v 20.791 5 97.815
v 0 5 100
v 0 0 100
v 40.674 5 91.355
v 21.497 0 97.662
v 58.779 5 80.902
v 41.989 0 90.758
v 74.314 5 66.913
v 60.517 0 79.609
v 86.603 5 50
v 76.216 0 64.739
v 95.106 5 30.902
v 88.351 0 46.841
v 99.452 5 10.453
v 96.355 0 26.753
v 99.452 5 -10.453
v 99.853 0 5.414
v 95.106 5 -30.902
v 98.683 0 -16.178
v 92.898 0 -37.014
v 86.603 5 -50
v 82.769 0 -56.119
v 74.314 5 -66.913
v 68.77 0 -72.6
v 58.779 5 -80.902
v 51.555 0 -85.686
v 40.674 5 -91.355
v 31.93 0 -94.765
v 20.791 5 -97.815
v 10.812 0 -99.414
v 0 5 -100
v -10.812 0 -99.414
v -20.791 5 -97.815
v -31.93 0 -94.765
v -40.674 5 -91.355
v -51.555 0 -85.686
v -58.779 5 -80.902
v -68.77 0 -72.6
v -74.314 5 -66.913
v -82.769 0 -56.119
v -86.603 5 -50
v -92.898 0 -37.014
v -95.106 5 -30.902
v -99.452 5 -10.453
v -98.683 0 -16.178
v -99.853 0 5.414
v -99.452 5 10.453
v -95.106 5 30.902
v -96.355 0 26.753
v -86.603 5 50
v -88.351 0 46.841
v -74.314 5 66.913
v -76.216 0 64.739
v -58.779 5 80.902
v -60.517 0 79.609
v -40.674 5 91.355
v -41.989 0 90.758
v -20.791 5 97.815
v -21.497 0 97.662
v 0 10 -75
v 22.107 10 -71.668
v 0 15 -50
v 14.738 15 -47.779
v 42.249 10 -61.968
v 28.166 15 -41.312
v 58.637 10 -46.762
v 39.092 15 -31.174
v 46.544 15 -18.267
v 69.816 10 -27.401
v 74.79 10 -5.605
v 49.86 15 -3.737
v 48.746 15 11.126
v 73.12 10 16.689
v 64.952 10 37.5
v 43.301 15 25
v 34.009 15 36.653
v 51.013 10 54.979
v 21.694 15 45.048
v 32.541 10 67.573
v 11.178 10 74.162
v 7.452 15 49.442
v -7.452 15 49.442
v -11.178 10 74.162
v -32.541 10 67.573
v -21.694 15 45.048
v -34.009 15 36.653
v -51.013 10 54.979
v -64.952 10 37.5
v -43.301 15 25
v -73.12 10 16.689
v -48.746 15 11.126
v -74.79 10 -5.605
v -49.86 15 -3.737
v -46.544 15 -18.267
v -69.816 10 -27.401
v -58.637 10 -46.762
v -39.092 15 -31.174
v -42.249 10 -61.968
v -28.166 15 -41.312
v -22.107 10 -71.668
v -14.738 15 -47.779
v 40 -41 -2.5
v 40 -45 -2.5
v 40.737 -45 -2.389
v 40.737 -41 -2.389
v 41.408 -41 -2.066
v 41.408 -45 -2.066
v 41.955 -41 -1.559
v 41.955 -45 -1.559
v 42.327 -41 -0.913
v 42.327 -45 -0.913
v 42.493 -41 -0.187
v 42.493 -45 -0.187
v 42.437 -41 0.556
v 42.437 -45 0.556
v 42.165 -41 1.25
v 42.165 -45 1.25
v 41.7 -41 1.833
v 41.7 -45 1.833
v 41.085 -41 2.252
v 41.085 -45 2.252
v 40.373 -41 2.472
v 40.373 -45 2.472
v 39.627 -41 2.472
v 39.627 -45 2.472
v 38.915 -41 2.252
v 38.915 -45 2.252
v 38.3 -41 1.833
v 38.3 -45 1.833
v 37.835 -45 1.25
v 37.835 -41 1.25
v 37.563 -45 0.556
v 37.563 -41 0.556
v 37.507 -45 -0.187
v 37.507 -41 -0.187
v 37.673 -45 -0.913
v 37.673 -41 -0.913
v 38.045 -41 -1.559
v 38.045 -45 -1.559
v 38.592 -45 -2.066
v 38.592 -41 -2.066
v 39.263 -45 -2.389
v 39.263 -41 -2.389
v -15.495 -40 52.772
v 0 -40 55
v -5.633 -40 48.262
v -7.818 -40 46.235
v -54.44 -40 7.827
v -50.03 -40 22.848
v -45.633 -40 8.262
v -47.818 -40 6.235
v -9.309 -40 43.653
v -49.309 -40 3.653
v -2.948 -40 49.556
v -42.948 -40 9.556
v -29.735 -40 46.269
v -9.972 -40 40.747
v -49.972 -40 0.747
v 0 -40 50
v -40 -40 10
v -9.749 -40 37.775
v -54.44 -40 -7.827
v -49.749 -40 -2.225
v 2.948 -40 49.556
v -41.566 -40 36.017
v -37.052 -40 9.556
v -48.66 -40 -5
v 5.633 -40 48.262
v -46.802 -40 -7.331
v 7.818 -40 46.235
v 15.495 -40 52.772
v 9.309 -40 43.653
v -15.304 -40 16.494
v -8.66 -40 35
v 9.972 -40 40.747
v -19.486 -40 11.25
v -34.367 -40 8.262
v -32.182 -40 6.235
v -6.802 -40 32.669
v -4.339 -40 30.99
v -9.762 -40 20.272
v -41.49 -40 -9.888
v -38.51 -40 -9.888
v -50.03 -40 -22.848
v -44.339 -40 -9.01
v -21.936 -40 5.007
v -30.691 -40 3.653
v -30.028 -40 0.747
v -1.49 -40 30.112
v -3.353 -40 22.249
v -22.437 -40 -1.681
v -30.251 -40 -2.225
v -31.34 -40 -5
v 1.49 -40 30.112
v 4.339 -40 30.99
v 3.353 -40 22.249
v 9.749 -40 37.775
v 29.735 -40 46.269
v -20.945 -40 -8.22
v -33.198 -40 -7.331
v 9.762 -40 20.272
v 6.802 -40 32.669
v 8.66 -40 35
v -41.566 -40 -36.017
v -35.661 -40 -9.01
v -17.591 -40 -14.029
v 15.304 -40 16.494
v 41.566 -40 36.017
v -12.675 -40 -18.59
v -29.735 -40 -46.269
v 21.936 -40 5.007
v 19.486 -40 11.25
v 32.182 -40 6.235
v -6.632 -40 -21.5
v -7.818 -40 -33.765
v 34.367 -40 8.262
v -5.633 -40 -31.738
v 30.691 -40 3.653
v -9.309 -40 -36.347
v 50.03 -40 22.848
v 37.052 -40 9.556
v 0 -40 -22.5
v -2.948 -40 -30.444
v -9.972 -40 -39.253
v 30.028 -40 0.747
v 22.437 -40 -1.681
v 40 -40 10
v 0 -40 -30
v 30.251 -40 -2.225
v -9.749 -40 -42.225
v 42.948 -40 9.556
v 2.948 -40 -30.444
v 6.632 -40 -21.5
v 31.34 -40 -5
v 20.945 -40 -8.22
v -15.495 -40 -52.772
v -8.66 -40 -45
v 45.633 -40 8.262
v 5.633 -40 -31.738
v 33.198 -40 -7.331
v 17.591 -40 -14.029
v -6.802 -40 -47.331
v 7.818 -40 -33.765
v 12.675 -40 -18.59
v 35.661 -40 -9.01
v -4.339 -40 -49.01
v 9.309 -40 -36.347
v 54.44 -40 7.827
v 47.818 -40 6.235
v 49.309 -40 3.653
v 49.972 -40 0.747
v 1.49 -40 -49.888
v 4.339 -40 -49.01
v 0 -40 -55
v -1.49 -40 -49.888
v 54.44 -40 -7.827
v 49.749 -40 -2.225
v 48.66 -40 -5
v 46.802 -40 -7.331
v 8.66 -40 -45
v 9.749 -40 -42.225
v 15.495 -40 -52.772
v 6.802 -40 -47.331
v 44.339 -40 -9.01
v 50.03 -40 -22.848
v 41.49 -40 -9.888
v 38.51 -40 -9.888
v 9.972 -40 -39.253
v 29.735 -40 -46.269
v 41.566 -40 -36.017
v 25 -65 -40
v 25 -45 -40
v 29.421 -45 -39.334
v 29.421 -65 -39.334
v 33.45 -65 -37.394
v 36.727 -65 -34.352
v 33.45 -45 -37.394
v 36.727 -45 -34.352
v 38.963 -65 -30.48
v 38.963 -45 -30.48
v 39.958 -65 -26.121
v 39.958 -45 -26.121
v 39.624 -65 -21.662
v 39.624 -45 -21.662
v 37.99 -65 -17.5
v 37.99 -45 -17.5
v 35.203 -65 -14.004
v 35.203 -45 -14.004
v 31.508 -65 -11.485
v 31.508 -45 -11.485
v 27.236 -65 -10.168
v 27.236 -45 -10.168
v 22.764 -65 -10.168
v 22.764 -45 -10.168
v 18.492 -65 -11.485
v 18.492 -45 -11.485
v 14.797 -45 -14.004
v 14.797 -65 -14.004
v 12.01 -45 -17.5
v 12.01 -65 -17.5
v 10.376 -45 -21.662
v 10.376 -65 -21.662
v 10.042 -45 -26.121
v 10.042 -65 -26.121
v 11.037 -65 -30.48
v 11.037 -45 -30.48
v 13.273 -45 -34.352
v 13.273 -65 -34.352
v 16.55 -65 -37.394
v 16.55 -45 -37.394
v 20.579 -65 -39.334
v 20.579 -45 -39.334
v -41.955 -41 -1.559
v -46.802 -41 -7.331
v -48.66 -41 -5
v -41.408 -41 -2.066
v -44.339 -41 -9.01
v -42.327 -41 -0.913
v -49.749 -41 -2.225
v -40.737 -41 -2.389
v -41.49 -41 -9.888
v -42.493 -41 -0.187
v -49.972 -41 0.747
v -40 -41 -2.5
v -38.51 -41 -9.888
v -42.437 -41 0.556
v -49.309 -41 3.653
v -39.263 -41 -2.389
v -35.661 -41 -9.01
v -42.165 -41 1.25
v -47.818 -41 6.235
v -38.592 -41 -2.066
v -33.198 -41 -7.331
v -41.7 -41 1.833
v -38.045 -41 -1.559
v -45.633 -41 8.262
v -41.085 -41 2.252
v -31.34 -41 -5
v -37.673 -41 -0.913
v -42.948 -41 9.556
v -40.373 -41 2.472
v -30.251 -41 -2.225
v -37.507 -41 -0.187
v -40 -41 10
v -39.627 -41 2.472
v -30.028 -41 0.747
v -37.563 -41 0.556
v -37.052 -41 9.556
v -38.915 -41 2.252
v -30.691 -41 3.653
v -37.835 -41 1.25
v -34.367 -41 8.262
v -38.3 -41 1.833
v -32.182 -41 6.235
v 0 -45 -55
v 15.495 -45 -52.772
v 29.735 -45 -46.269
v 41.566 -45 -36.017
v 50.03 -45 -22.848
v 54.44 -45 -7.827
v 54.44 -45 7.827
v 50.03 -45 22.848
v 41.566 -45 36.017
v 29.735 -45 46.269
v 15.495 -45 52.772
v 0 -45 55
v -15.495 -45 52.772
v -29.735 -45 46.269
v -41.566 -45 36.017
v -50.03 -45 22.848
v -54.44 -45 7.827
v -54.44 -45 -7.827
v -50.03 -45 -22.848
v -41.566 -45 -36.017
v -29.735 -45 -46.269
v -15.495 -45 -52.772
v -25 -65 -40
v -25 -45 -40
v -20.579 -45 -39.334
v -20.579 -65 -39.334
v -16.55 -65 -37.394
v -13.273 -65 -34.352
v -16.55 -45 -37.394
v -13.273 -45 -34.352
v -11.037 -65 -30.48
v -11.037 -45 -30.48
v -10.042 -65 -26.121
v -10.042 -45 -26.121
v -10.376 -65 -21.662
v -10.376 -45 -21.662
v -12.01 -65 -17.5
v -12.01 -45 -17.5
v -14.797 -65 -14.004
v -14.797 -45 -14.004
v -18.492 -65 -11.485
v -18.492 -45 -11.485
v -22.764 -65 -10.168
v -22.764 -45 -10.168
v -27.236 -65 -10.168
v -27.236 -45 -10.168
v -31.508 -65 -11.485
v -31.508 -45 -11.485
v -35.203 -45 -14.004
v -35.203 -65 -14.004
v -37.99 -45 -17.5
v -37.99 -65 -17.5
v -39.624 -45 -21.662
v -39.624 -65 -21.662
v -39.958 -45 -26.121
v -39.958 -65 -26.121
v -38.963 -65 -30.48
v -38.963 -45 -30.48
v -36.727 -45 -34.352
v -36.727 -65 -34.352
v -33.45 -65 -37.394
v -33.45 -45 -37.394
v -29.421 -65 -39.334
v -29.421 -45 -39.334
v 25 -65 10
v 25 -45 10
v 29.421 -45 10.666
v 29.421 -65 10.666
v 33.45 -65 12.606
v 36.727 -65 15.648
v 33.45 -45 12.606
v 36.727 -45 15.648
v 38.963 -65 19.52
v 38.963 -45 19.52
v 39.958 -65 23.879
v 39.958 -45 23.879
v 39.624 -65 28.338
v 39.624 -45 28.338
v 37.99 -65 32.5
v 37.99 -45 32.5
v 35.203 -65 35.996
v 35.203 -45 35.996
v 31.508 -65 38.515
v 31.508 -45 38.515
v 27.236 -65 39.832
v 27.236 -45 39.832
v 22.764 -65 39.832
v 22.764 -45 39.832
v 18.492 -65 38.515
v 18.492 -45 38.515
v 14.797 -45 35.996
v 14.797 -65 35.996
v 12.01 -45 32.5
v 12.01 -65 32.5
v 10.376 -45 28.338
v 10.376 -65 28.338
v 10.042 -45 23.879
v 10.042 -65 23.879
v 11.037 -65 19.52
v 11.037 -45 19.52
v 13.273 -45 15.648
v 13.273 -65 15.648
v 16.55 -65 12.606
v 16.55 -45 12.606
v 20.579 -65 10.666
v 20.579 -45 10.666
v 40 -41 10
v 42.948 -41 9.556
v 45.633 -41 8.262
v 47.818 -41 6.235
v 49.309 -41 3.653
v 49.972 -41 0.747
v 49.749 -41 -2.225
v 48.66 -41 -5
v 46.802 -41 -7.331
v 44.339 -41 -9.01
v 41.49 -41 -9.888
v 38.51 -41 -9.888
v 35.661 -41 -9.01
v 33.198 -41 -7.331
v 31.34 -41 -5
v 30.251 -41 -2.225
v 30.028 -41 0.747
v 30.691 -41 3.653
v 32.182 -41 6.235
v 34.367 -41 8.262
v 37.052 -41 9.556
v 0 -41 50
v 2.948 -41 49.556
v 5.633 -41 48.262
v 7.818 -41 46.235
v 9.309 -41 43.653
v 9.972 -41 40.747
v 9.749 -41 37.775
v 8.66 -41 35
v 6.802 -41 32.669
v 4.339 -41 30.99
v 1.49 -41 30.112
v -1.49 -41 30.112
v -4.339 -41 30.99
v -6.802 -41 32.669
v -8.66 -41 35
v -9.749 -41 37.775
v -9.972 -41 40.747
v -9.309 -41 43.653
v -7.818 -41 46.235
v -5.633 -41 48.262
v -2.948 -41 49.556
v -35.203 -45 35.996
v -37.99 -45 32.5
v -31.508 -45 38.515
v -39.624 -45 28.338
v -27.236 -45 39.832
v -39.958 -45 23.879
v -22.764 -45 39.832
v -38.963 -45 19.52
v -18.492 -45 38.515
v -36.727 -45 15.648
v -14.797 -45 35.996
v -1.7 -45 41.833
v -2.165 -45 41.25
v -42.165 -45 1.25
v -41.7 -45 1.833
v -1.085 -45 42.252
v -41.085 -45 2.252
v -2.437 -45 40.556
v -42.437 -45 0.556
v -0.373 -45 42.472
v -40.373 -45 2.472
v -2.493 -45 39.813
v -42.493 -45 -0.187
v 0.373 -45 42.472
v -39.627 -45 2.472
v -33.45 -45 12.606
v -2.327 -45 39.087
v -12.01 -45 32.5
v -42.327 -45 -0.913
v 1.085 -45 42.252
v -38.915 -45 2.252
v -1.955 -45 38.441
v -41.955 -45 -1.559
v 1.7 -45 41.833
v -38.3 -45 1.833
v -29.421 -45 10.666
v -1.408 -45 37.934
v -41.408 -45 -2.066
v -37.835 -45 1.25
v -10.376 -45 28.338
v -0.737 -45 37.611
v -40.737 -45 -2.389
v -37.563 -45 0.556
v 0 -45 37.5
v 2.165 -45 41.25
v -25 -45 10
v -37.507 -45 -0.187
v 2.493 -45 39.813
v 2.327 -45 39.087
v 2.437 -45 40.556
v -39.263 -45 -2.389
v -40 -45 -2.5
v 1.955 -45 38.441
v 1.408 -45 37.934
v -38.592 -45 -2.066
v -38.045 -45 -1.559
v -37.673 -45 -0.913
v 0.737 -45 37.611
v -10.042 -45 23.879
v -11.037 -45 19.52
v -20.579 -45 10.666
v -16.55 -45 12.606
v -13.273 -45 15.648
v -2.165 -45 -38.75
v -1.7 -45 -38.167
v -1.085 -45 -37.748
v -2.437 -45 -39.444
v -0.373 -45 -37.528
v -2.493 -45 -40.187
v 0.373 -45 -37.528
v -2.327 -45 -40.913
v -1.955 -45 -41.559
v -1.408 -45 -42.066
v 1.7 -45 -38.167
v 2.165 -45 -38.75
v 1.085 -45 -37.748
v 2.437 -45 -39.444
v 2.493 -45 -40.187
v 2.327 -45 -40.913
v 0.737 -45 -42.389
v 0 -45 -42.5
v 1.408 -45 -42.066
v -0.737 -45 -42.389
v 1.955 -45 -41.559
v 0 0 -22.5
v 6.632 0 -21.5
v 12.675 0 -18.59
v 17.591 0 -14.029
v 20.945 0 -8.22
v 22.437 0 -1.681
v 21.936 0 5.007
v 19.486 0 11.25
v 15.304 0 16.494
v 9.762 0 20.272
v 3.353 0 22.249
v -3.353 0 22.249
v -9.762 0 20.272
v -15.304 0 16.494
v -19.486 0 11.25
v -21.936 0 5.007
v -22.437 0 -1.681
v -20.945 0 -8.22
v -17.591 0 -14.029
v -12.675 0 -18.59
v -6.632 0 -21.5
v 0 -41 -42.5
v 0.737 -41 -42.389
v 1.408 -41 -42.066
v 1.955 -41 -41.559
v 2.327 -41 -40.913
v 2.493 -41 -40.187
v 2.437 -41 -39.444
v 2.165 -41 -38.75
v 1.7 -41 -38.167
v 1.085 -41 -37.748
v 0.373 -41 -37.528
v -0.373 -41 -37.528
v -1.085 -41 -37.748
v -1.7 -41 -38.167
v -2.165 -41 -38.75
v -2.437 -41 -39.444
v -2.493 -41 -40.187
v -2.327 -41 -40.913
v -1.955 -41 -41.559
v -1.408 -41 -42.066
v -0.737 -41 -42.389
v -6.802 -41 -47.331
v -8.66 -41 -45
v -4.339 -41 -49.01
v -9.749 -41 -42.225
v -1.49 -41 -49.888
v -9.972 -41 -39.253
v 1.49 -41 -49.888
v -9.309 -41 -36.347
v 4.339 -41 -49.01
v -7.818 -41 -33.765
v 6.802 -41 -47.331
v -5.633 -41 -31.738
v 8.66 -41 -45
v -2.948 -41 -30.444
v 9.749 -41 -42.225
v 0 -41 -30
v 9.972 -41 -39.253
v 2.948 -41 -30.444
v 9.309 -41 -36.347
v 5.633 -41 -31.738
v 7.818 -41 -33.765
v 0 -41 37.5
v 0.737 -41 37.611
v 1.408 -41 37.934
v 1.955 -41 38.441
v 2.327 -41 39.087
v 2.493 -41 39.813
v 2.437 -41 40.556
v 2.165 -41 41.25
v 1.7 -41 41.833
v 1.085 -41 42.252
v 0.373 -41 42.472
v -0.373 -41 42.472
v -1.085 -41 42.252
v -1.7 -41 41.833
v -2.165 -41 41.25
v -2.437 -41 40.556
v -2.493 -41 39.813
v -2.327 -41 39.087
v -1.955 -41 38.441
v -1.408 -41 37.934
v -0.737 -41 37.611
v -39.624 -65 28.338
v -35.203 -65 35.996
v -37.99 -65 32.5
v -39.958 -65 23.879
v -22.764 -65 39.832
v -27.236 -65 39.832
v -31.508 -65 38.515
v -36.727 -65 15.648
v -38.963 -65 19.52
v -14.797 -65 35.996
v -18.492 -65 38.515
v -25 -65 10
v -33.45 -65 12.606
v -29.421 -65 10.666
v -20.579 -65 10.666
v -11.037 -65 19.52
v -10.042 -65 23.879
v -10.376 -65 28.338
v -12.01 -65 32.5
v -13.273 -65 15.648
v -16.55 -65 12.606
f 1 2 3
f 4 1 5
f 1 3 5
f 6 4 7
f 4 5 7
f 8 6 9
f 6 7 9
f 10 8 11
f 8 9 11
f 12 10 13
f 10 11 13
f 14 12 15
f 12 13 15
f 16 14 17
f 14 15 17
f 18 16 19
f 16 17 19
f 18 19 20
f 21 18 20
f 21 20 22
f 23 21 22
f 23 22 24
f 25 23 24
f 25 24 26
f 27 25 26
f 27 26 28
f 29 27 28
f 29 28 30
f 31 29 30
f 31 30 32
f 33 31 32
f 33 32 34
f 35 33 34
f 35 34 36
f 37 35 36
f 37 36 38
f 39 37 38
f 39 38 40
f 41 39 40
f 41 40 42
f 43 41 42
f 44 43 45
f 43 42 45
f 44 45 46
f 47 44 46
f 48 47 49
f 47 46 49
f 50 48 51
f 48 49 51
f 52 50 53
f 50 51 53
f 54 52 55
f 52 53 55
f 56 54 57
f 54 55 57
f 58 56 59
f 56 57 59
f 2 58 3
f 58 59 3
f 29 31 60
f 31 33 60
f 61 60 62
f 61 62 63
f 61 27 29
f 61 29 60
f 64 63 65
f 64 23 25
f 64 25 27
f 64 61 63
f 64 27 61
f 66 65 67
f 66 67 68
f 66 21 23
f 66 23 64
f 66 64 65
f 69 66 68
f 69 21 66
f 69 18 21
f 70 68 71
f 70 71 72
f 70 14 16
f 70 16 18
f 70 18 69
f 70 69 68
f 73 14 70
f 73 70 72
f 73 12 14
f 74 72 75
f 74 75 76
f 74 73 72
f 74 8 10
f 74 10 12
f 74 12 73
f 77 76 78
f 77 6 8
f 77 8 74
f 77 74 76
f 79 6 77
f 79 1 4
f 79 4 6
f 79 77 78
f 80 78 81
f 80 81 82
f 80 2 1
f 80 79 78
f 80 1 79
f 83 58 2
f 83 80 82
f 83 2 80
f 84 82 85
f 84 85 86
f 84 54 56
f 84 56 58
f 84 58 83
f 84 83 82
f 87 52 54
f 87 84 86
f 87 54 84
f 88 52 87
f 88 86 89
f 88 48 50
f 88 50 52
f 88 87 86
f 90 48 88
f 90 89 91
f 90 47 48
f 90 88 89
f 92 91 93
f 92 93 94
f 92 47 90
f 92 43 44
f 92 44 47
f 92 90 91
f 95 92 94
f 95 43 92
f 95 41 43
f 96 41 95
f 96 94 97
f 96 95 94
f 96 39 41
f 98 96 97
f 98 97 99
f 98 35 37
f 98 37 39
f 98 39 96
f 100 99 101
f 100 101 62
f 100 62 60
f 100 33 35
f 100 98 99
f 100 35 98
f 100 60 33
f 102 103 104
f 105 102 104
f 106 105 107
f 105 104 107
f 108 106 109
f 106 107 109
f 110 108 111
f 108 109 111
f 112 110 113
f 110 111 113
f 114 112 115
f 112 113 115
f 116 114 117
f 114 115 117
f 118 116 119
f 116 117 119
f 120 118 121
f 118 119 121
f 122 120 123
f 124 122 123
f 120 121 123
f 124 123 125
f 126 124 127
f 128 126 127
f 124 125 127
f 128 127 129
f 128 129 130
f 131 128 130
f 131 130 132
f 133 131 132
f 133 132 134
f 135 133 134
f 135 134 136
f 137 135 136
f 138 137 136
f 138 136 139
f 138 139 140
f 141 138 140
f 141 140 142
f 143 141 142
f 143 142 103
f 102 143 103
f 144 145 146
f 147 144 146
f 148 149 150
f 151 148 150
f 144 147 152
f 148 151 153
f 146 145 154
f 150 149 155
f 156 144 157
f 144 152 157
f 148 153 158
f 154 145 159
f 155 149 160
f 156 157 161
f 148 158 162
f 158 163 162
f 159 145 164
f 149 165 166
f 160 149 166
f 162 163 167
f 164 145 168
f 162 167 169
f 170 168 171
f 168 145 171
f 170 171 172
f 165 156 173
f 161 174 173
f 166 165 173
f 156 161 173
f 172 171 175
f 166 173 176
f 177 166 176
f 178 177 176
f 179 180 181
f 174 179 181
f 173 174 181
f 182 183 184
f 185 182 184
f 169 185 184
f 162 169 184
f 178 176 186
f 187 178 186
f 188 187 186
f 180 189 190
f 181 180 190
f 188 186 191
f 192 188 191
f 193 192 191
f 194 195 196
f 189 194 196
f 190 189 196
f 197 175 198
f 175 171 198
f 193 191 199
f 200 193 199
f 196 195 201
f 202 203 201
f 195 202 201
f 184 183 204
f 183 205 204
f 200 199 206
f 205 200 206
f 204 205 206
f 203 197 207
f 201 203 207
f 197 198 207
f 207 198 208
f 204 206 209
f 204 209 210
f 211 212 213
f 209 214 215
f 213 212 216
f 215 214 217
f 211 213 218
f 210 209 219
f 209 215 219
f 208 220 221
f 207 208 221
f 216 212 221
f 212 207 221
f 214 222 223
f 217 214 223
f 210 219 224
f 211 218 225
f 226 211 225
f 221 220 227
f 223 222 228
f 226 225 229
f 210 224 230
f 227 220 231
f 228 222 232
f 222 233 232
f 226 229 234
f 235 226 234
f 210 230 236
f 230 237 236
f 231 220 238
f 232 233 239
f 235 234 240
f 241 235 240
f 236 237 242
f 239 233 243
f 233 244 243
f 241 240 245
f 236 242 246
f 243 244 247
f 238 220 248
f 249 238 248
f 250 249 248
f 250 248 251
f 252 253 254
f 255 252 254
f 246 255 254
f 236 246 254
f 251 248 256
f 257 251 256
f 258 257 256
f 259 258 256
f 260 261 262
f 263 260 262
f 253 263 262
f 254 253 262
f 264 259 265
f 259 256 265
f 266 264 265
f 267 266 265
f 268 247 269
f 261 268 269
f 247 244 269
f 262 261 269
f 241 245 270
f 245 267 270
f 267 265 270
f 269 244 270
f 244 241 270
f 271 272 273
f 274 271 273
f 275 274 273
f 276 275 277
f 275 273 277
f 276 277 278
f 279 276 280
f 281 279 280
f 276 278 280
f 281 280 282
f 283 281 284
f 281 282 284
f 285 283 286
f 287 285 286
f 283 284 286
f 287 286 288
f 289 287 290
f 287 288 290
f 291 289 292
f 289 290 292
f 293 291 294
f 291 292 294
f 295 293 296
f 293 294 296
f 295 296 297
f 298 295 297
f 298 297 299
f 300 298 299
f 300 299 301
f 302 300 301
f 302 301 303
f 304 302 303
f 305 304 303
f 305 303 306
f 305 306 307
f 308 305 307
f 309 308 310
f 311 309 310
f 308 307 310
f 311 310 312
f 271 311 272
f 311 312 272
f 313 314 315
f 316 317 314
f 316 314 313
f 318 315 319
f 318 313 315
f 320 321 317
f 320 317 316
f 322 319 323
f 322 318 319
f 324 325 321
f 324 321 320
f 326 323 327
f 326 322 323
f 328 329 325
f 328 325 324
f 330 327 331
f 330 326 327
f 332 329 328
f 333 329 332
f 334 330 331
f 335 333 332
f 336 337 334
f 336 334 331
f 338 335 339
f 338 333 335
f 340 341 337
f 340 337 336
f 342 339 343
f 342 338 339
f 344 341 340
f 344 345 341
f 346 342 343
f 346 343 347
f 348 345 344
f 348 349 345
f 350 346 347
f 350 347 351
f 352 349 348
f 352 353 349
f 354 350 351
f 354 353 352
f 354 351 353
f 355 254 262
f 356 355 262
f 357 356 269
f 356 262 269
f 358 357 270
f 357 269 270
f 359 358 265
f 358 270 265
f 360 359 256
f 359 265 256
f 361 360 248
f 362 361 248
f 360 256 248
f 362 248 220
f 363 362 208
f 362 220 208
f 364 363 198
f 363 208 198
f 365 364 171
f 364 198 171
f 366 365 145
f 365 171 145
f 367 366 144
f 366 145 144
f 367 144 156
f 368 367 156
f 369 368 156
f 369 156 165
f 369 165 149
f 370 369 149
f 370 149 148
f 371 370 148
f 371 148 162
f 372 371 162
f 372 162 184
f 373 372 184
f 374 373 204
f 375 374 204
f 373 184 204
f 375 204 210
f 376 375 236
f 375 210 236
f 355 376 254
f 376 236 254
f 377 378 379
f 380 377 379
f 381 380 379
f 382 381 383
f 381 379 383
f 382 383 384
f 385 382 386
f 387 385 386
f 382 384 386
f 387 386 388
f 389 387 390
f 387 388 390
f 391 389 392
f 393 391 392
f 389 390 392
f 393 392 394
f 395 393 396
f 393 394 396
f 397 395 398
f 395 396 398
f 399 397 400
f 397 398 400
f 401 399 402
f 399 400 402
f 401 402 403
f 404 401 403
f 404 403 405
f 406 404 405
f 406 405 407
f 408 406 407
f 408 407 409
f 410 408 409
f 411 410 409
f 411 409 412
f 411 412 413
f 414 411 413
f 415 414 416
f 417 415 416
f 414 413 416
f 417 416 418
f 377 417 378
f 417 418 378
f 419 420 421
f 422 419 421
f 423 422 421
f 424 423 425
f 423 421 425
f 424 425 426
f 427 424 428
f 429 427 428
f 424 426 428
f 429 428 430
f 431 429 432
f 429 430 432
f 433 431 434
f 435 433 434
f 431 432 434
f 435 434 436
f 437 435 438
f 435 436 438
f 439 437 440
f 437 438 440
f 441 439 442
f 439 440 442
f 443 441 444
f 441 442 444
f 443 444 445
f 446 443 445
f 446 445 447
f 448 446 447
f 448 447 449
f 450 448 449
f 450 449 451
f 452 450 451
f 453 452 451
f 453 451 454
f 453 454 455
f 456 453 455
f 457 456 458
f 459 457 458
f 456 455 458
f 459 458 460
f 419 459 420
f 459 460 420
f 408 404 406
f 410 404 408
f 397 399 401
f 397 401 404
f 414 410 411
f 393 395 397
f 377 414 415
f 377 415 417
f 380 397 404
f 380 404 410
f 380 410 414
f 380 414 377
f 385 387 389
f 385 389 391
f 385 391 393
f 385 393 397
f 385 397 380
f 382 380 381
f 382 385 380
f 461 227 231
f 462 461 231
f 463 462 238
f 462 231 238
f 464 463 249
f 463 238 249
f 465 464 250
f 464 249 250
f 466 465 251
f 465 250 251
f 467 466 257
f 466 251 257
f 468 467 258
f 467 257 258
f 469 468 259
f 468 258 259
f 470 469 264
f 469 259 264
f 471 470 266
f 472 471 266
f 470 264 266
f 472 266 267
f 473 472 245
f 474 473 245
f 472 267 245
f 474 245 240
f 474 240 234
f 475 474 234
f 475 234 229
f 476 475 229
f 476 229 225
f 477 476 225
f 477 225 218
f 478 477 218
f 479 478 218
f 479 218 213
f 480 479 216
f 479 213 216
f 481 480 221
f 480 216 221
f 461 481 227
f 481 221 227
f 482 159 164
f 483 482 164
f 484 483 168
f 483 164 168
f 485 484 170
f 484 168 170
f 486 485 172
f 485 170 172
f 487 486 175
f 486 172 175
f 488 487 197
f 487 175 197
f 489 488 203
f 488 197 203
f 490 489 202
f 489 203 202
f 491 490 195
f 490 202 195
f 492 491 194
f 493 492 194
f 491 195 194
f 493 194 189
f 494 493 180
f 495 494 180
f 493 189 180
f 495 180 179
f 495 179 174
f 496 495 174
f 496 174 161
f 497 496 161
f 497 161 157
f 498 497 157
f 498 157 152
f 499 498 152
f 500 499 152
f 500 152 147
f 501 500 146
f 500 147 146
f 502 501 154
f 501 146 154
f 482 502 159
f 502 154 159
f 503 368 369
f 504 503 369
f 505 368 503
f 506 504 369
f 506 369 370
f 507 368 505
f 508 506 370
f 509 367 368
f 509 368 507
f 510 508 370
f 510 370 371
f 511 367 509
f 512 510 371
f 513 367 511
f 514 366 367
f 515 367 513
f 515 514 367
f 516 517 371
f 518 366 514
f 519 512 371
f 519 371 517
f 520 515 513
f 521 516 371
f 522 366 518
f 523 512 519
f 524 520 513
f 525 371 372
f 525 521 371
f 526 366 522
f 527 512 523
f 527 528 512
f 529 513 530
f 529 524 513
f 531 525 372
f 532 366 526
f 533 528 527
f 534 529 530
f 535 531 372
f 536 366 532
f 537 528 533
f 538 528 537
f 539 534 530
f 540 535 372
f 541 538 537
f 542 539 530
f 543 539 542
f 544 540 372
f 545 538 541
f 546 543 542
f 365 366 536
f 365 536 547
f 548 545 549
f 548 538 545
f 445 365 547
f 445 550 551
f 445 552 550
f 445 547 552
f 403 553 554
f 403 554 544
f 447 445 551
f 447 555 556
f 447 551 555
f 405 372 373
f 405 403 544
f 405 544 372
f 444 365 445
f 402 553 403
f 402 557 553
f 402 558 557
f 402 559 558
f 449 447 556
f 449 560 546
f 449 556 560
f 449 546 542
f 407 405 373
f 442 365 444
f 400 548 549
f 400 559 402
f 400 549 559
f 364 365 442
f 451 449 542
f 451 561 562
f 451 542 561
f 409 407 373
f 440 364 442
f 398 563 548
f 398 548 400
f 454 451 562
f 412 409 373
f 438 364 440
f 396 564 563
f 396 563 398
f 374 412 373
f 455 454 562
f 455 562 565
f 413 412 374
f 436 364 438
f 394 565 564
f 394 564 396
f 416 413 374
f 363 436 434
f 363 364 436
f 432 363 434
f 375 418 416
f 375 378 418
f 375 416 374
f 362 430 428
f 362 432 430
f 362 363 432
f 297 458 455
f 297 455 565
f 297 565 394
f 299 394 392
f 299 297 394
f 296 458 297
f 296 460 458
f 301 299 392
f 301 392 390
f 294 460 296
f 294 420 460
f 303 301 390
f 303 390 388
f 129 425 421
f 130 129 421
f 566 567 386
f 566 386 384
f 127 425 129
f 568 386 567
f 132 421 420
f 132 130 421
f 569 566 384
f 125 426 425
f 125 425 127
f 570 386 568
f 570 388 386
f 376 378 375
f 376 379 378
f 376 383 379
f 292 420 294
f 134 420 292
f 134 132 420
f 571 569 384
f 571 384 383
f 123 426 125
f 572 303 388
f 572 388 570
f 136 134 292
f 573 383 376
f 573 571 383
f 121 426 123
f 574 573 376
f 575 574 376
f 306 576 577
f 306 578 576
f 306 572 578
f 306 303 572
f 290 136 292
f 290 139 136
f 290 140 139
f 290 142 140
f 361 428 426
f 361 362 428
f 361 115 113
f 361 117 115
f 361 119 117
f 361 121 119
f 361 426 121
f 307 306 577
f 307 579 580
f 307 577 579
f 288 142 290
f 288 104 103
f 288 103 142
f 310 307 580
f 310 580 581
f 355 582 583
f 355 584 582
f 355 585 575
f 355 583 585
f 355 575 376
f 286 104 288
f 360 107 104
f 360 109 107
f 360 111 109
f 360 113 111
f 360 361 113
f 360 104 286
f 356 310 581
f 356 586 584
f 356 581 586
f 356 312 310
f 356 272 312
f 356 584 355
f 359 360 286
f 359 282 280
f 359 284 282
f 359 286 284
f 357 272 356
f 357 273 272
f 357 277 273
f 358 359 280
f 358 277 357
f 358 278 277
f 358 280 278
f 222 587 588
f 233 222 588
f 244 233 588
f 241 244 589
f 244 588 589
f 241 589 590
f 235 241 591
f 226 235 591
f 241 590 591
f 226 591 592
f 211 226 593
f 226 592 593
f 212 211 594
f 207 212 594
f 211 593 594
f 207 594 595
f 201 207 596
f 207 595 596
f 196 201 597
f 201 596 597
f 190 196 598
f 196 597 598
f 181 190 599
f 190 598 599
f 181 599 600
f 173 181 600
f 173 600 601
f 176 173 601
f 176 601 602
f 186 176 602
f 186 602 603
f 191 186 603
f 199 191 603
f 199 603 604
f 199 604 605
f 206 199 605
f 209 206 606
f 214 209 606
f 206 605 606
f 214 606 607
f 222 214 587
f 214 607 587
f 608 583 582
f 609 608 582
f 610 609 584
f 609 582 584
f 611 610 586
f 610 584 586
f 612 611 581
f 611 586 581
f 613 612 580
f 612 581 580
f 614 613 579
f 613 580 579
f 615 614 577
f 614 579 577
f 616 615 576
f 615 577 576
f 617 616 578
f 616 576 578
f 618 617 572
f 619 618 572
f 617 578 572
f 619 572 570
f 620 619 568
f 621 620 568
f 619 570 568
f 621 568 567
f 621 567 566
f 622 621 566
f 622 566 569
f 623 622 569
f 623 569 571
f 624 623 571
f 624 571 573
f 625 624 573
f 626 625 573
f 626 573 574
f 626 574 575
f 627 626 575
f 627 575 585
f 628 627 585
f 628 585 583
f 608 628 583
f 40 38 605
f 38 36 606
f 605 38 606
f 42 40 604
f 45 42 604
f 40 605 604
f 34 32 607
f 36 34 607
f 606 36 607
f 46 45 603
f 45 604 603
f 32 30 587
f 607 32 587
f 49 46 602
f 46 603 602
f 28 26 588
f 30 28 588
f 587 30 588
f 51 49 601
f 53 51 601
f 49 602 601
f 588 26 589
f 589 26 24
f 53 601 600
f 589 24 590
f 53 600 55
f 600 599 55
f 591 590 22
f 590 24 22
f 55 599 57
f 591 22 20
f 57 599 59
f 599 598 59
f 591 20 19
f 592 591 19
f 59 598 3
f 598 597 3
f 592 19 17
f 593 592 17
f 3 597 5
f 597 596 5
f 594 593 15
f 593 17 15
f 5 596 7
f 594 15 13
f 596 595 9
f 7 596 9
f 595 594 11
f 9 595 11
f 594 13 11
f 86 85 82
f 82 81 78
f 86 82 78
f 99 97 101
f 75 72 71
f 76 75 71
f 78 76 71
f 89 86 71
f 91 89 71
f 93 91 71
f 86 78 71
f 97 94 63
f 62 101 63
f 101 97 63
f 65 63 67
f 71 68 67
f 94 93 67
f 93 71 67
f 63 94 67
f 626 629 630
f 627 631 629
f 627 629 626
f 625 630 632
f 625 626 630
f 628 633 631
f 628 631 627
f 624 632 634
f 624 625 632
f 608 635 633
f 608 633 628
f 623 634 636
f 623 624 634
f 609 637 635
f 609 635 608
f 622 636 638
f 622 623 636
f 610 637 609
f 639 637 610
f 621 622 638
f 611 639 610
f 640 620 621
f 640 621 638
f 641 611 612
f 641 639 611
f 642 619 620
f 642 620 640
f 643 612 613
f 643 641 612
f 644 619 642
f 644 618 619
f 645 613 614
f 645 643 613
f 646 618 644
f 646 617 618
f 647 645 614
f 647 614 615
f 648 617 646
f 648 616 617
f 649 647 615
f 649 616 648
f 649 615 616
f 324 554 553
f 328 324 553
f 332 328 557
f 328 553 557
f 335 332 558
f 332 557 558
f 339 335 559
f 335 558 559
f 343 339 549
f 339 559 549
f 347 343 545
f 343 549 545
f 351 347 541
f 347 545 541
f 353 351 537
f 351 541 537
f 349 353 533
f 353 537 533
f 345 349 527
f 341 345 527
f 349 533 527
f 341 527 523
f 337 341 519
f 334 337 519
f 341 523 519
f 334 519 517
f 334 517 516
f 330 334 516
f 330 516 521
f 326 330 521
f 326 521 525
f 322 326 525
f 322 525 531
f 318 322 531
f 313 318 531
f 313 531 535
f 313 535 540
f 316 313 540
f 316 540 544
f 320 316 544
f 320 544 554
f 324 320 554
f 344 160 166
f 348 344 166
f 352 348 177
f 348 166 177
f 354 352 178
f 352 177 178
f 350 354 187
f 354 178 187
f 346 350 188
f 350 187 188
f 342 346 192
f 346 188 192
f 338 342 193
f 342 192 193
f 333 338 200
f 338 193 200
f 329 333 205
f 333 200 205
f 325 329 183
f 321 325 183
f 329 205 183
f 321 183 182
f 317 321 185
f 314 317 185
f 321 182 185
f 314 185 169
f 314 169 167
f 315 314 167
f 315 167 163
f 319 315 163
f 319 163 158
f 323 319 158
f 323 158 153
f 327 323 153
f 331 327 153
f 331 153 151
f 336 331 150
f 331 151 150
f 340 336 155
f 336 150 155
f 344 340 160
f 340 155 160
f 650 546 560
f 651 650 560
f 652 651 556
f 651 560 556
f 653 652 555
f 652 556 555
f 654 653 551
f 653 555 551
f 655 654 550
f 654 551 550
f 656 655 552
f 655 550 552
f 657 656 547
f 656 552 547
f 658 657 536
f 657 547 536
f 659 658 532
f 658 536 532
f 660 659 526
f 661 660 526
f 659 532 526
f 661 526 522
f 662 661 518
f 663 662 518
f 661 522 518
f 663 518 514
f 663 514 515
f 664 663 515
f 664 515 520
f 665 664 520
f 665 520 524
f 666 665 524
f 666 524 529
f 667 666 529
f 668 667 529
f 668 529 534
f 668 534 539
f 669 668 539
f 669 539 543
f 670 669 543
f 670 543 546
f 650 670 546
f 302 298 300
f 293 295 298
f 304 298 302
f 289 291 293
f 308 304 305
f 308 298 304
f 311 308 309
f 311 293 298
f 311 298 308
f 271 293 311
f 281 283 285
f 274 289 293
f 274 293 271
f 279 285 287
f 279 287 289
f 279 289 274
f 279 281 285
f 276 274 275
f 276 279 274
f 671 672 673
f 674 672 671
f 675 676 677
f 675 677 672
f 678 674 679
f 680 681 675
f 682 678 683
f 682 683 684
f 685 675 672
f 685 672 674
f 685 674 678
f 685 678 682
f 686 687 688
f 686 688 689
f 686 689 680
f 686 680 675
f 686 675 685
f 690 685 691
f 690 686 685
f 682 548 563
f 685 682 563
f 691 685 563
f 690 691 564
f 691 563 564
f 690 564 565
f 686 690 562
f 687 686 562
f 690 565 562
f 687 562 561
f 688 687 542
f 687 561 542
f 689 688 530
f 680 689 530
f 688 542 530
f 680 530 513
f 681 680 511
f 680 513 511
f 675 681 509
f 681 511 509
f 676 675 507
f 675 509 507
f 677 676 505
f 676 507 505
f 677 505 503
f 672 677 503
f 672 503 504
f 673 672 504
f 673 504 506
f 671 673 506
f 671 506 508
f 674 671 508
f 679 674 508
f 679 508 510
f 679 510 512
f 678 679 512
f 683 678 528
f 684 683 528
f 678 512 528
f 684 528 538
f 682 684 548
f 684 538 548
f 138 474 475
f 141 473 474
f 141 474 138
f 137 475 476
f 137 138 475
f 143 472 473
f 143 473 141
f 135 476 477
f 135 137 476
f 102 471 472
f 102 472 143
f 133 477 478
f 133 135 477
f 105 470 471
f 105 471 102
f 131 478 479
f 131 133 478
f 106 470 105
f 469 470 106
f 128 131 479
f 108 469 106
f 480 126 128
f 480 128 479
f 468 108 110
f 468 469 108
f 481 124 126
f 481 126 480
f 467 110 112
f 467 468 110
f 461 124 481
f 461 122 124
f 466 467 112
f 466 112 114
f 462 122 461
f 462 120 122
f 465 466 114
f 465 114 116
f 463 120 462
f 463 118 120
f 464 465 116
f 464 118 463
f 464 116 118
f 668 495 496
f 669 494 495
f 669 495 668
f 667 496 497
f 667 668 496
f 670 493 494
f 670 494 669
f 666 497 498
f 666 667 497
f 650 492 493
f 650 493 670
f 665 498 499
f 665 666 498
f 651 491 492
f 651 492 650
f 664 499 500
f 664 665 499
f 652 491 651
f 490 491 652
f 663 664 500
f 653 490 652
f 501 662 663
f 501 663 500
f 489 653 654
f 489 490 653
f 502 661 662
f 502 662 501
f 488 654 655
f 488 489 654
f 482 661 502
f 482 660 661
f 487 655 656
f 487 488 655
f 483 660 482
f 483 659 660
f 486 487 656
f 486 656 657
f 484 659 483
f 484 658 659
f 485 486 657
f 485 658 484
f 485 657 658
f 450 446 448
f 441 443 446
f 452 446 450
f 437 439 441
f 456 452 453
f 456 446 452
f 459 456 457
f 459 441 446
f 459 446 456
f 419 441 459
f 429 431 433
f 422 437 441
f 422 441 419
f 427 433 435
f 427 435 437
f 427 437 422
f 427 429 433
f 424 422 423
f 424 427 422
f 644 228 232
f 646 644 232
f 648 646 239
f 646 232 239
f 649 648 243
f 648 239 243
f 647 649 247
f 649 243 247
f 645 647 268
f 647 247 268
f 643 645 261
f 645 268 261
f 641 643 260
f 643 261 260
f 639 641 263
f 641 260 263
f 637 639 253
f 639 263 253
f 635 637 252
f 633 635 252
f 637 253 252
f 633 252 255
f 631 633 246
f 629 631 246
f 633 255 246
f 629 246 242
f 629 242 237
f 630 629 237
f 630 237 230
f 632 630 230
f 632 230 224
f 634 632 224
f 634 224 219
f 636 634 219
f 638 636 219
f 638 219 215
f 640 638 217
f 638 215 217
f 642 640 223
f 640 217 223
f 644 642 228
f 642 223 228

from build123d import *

# Parameters (mm, degrees)
SKETCH1_R           = 100
BOSS_EXTRUDE1_DEPTH = 5
SKETCH2_R           = 50
BOSS_EXTRUDE2_DEPTH = 5
SKETCH3_R           = 10
SKETCH3_R_2         = 5
BOSS_EXTRUDE3_DEPTH = 5
SKETCH5_R           = 22.5
BOSS_EXTRUDE4_DEPTH = 40
SKETCH6_R           = 55
BOSS_EXTRUDE5_DEPTH = 5
SKETCH7_R           = 15
BOSS_EXTRUDE6_DEPTH = 20
SKETCH9_R           = 2.5
CUT_EXTRUDE2_DEPTH  = 5
SKETCH11_R          = 10
CUT_EXTRUDE3_DEPTH  = 1


with BuildPart() as part:
    # Sketch1 → Boss-Extrude1 (new body)
    with BuildSketch(Plane(origin=(0, 0, 0), x_dir=(1, 0, 0), z_dir=(0, 1, 0))):
        with Locations(Location((0, 0, 0), (0, 0, 270))):
            Circle(SKETCH1_R)
    extrude(amount=BOSS_EXTRUDE1_DEPTH)



with BuildPart() as body_2:
    # Sketch2 → Boss-Extrude2 (new body)
    with BuildSketch(Plane(origin=(0, 15, 0), x_dir=(-1, 0, 0), z_dir=(0, -1, 0))):
        with Locations(Location((0, 0, 0), (0, 0, 90))):
            Circle(SKETCH2_R)
    extrude(amount=BOSS_EXTRUDE2_DEPTH)


with BuildPart() as part_1:
    add(part.part)

    add(body_2.part)  # Boss-Extrude3 merges body 2
    # Sketch3 → Boss-Extrude3 (add)
    with BuildSketch(Plane(origin=(0, 5, 0), x_dir=(1, 0, 0), z_dir=(0, 1, 0))):
        with Locations(Location((0, 0, 0), (0, 0, 90))):
            Circle(SKETCH3_R)
        with Locations(Location((0, 0, 0), (0, 0, 90))):
            Circle(SKETCH3_R_2, mode=Mode.SUBTRACT)
    extrude(amount=BOSS_EXTRUDE3_DEPTH)

    # Sketch4 → Revolve1 (revolve)
    with BuildSketch(Plane.XY, mode=Mode.PRIVATE) as revolve1_sk:
        Polygon((50, 15), (100, 5), (0, 5), (0, 10), (50, 10), align=None)
    revolve(revolve1_sk.sketch.rotate(Axis((0, 54.07219912, 0), (0, -1, 0)), 270), axis=Axis((0, 54.07219912, 0), (0, -1, 0)))

    # Sketch5 → Boss-Extrude4 (add)
    with BuildSketch(Plane.XZ):
        with Locations(Location((0, 0, 0), (0, 0, 270))):
            Circle(SKETCH5_R)
    extrude(amount=BOSS_EXTRUDE4_DEPTH)

    # Sketch6 → Boss-Extrude5 (add)
    with BuildSketch(Plane.XZ.offset(40)):
        with Locations(Location((0, 0, 0), (0, 0, 270))):
            Circle(SKETCH6_R)
    extrude(amount=BOSS_EXTRUDE5_DEPTH)

    # Sketch7 → Boss-Extrude6 (add)
    with BuildSketch(Plane.XZ.offset(45)):
        with Locations(Location((-25, -25, 0), (0, 0, 270))):
            Circle(SKETCH7_R)
        with Locations(Location((25, -25, 0), (0, 0, 270))):
            Circle(SKETCH7_R)
        with Locations(Location((25, 25, 0), (0, 0, 270))):
            Circle(SKETCH7_R)
        with Locations(Location((-25, 25, 0), (0, 0, 270))):
            Circle(SKETCH7_R)
    extrude(amount=BOSS_EXTRUDE6_DEPTH)

    # Sketch9 → Cut-Extrude2 (cut)
    with BuildSketch(Plane.XZ.offset(45)):
        with Locations(Location((0, 40, 0), (0, 0, 270))):
            Circle(SKETCH9_R)
        with Locations(Location((40, 0, 0), (0, 0, 270))):
            Circle(SKETCH9_R)
        with Locations(Location((0, -40, 0), (0, 0, 270))):
            Circle(SKETCH9_R)
        with Locations(Location((-40, 0, 0), (0, 0, 270))):
            Circle(SKETCH9_R)
    extrude(amount=-CUT_EXTRUDE2_DEPTH, mode=Mode.SUBTRACT)

    # Sketch11 → Cut-Extrude3 (cut)
    with BuildSketch(Plane(origin=(0, -40, 0), x_dir=(1, 0, 0), z_dir=(0, 1, 0))):
        with Locations(Location((0, 40, 0), (0, 0, 270))):
            Circle(SKETCH11_R)
        with Locations(Location((40, 0, 0), (0, 0, 270))):
            Circle(SKETCH11_R)
        with Locations(Location((0, -40, 0), (0, 0, 270))):
            Circle(SKETCH11_R)
        with Locations(Location((-40, 0, 0), (0, 0, 270))):
            Circle(SKETCH11_R)
    extrude(amount=-CUT_EXTRUDE3_DEPTH, mode=Mode.SUBTRACT)


solid = part_1.part
